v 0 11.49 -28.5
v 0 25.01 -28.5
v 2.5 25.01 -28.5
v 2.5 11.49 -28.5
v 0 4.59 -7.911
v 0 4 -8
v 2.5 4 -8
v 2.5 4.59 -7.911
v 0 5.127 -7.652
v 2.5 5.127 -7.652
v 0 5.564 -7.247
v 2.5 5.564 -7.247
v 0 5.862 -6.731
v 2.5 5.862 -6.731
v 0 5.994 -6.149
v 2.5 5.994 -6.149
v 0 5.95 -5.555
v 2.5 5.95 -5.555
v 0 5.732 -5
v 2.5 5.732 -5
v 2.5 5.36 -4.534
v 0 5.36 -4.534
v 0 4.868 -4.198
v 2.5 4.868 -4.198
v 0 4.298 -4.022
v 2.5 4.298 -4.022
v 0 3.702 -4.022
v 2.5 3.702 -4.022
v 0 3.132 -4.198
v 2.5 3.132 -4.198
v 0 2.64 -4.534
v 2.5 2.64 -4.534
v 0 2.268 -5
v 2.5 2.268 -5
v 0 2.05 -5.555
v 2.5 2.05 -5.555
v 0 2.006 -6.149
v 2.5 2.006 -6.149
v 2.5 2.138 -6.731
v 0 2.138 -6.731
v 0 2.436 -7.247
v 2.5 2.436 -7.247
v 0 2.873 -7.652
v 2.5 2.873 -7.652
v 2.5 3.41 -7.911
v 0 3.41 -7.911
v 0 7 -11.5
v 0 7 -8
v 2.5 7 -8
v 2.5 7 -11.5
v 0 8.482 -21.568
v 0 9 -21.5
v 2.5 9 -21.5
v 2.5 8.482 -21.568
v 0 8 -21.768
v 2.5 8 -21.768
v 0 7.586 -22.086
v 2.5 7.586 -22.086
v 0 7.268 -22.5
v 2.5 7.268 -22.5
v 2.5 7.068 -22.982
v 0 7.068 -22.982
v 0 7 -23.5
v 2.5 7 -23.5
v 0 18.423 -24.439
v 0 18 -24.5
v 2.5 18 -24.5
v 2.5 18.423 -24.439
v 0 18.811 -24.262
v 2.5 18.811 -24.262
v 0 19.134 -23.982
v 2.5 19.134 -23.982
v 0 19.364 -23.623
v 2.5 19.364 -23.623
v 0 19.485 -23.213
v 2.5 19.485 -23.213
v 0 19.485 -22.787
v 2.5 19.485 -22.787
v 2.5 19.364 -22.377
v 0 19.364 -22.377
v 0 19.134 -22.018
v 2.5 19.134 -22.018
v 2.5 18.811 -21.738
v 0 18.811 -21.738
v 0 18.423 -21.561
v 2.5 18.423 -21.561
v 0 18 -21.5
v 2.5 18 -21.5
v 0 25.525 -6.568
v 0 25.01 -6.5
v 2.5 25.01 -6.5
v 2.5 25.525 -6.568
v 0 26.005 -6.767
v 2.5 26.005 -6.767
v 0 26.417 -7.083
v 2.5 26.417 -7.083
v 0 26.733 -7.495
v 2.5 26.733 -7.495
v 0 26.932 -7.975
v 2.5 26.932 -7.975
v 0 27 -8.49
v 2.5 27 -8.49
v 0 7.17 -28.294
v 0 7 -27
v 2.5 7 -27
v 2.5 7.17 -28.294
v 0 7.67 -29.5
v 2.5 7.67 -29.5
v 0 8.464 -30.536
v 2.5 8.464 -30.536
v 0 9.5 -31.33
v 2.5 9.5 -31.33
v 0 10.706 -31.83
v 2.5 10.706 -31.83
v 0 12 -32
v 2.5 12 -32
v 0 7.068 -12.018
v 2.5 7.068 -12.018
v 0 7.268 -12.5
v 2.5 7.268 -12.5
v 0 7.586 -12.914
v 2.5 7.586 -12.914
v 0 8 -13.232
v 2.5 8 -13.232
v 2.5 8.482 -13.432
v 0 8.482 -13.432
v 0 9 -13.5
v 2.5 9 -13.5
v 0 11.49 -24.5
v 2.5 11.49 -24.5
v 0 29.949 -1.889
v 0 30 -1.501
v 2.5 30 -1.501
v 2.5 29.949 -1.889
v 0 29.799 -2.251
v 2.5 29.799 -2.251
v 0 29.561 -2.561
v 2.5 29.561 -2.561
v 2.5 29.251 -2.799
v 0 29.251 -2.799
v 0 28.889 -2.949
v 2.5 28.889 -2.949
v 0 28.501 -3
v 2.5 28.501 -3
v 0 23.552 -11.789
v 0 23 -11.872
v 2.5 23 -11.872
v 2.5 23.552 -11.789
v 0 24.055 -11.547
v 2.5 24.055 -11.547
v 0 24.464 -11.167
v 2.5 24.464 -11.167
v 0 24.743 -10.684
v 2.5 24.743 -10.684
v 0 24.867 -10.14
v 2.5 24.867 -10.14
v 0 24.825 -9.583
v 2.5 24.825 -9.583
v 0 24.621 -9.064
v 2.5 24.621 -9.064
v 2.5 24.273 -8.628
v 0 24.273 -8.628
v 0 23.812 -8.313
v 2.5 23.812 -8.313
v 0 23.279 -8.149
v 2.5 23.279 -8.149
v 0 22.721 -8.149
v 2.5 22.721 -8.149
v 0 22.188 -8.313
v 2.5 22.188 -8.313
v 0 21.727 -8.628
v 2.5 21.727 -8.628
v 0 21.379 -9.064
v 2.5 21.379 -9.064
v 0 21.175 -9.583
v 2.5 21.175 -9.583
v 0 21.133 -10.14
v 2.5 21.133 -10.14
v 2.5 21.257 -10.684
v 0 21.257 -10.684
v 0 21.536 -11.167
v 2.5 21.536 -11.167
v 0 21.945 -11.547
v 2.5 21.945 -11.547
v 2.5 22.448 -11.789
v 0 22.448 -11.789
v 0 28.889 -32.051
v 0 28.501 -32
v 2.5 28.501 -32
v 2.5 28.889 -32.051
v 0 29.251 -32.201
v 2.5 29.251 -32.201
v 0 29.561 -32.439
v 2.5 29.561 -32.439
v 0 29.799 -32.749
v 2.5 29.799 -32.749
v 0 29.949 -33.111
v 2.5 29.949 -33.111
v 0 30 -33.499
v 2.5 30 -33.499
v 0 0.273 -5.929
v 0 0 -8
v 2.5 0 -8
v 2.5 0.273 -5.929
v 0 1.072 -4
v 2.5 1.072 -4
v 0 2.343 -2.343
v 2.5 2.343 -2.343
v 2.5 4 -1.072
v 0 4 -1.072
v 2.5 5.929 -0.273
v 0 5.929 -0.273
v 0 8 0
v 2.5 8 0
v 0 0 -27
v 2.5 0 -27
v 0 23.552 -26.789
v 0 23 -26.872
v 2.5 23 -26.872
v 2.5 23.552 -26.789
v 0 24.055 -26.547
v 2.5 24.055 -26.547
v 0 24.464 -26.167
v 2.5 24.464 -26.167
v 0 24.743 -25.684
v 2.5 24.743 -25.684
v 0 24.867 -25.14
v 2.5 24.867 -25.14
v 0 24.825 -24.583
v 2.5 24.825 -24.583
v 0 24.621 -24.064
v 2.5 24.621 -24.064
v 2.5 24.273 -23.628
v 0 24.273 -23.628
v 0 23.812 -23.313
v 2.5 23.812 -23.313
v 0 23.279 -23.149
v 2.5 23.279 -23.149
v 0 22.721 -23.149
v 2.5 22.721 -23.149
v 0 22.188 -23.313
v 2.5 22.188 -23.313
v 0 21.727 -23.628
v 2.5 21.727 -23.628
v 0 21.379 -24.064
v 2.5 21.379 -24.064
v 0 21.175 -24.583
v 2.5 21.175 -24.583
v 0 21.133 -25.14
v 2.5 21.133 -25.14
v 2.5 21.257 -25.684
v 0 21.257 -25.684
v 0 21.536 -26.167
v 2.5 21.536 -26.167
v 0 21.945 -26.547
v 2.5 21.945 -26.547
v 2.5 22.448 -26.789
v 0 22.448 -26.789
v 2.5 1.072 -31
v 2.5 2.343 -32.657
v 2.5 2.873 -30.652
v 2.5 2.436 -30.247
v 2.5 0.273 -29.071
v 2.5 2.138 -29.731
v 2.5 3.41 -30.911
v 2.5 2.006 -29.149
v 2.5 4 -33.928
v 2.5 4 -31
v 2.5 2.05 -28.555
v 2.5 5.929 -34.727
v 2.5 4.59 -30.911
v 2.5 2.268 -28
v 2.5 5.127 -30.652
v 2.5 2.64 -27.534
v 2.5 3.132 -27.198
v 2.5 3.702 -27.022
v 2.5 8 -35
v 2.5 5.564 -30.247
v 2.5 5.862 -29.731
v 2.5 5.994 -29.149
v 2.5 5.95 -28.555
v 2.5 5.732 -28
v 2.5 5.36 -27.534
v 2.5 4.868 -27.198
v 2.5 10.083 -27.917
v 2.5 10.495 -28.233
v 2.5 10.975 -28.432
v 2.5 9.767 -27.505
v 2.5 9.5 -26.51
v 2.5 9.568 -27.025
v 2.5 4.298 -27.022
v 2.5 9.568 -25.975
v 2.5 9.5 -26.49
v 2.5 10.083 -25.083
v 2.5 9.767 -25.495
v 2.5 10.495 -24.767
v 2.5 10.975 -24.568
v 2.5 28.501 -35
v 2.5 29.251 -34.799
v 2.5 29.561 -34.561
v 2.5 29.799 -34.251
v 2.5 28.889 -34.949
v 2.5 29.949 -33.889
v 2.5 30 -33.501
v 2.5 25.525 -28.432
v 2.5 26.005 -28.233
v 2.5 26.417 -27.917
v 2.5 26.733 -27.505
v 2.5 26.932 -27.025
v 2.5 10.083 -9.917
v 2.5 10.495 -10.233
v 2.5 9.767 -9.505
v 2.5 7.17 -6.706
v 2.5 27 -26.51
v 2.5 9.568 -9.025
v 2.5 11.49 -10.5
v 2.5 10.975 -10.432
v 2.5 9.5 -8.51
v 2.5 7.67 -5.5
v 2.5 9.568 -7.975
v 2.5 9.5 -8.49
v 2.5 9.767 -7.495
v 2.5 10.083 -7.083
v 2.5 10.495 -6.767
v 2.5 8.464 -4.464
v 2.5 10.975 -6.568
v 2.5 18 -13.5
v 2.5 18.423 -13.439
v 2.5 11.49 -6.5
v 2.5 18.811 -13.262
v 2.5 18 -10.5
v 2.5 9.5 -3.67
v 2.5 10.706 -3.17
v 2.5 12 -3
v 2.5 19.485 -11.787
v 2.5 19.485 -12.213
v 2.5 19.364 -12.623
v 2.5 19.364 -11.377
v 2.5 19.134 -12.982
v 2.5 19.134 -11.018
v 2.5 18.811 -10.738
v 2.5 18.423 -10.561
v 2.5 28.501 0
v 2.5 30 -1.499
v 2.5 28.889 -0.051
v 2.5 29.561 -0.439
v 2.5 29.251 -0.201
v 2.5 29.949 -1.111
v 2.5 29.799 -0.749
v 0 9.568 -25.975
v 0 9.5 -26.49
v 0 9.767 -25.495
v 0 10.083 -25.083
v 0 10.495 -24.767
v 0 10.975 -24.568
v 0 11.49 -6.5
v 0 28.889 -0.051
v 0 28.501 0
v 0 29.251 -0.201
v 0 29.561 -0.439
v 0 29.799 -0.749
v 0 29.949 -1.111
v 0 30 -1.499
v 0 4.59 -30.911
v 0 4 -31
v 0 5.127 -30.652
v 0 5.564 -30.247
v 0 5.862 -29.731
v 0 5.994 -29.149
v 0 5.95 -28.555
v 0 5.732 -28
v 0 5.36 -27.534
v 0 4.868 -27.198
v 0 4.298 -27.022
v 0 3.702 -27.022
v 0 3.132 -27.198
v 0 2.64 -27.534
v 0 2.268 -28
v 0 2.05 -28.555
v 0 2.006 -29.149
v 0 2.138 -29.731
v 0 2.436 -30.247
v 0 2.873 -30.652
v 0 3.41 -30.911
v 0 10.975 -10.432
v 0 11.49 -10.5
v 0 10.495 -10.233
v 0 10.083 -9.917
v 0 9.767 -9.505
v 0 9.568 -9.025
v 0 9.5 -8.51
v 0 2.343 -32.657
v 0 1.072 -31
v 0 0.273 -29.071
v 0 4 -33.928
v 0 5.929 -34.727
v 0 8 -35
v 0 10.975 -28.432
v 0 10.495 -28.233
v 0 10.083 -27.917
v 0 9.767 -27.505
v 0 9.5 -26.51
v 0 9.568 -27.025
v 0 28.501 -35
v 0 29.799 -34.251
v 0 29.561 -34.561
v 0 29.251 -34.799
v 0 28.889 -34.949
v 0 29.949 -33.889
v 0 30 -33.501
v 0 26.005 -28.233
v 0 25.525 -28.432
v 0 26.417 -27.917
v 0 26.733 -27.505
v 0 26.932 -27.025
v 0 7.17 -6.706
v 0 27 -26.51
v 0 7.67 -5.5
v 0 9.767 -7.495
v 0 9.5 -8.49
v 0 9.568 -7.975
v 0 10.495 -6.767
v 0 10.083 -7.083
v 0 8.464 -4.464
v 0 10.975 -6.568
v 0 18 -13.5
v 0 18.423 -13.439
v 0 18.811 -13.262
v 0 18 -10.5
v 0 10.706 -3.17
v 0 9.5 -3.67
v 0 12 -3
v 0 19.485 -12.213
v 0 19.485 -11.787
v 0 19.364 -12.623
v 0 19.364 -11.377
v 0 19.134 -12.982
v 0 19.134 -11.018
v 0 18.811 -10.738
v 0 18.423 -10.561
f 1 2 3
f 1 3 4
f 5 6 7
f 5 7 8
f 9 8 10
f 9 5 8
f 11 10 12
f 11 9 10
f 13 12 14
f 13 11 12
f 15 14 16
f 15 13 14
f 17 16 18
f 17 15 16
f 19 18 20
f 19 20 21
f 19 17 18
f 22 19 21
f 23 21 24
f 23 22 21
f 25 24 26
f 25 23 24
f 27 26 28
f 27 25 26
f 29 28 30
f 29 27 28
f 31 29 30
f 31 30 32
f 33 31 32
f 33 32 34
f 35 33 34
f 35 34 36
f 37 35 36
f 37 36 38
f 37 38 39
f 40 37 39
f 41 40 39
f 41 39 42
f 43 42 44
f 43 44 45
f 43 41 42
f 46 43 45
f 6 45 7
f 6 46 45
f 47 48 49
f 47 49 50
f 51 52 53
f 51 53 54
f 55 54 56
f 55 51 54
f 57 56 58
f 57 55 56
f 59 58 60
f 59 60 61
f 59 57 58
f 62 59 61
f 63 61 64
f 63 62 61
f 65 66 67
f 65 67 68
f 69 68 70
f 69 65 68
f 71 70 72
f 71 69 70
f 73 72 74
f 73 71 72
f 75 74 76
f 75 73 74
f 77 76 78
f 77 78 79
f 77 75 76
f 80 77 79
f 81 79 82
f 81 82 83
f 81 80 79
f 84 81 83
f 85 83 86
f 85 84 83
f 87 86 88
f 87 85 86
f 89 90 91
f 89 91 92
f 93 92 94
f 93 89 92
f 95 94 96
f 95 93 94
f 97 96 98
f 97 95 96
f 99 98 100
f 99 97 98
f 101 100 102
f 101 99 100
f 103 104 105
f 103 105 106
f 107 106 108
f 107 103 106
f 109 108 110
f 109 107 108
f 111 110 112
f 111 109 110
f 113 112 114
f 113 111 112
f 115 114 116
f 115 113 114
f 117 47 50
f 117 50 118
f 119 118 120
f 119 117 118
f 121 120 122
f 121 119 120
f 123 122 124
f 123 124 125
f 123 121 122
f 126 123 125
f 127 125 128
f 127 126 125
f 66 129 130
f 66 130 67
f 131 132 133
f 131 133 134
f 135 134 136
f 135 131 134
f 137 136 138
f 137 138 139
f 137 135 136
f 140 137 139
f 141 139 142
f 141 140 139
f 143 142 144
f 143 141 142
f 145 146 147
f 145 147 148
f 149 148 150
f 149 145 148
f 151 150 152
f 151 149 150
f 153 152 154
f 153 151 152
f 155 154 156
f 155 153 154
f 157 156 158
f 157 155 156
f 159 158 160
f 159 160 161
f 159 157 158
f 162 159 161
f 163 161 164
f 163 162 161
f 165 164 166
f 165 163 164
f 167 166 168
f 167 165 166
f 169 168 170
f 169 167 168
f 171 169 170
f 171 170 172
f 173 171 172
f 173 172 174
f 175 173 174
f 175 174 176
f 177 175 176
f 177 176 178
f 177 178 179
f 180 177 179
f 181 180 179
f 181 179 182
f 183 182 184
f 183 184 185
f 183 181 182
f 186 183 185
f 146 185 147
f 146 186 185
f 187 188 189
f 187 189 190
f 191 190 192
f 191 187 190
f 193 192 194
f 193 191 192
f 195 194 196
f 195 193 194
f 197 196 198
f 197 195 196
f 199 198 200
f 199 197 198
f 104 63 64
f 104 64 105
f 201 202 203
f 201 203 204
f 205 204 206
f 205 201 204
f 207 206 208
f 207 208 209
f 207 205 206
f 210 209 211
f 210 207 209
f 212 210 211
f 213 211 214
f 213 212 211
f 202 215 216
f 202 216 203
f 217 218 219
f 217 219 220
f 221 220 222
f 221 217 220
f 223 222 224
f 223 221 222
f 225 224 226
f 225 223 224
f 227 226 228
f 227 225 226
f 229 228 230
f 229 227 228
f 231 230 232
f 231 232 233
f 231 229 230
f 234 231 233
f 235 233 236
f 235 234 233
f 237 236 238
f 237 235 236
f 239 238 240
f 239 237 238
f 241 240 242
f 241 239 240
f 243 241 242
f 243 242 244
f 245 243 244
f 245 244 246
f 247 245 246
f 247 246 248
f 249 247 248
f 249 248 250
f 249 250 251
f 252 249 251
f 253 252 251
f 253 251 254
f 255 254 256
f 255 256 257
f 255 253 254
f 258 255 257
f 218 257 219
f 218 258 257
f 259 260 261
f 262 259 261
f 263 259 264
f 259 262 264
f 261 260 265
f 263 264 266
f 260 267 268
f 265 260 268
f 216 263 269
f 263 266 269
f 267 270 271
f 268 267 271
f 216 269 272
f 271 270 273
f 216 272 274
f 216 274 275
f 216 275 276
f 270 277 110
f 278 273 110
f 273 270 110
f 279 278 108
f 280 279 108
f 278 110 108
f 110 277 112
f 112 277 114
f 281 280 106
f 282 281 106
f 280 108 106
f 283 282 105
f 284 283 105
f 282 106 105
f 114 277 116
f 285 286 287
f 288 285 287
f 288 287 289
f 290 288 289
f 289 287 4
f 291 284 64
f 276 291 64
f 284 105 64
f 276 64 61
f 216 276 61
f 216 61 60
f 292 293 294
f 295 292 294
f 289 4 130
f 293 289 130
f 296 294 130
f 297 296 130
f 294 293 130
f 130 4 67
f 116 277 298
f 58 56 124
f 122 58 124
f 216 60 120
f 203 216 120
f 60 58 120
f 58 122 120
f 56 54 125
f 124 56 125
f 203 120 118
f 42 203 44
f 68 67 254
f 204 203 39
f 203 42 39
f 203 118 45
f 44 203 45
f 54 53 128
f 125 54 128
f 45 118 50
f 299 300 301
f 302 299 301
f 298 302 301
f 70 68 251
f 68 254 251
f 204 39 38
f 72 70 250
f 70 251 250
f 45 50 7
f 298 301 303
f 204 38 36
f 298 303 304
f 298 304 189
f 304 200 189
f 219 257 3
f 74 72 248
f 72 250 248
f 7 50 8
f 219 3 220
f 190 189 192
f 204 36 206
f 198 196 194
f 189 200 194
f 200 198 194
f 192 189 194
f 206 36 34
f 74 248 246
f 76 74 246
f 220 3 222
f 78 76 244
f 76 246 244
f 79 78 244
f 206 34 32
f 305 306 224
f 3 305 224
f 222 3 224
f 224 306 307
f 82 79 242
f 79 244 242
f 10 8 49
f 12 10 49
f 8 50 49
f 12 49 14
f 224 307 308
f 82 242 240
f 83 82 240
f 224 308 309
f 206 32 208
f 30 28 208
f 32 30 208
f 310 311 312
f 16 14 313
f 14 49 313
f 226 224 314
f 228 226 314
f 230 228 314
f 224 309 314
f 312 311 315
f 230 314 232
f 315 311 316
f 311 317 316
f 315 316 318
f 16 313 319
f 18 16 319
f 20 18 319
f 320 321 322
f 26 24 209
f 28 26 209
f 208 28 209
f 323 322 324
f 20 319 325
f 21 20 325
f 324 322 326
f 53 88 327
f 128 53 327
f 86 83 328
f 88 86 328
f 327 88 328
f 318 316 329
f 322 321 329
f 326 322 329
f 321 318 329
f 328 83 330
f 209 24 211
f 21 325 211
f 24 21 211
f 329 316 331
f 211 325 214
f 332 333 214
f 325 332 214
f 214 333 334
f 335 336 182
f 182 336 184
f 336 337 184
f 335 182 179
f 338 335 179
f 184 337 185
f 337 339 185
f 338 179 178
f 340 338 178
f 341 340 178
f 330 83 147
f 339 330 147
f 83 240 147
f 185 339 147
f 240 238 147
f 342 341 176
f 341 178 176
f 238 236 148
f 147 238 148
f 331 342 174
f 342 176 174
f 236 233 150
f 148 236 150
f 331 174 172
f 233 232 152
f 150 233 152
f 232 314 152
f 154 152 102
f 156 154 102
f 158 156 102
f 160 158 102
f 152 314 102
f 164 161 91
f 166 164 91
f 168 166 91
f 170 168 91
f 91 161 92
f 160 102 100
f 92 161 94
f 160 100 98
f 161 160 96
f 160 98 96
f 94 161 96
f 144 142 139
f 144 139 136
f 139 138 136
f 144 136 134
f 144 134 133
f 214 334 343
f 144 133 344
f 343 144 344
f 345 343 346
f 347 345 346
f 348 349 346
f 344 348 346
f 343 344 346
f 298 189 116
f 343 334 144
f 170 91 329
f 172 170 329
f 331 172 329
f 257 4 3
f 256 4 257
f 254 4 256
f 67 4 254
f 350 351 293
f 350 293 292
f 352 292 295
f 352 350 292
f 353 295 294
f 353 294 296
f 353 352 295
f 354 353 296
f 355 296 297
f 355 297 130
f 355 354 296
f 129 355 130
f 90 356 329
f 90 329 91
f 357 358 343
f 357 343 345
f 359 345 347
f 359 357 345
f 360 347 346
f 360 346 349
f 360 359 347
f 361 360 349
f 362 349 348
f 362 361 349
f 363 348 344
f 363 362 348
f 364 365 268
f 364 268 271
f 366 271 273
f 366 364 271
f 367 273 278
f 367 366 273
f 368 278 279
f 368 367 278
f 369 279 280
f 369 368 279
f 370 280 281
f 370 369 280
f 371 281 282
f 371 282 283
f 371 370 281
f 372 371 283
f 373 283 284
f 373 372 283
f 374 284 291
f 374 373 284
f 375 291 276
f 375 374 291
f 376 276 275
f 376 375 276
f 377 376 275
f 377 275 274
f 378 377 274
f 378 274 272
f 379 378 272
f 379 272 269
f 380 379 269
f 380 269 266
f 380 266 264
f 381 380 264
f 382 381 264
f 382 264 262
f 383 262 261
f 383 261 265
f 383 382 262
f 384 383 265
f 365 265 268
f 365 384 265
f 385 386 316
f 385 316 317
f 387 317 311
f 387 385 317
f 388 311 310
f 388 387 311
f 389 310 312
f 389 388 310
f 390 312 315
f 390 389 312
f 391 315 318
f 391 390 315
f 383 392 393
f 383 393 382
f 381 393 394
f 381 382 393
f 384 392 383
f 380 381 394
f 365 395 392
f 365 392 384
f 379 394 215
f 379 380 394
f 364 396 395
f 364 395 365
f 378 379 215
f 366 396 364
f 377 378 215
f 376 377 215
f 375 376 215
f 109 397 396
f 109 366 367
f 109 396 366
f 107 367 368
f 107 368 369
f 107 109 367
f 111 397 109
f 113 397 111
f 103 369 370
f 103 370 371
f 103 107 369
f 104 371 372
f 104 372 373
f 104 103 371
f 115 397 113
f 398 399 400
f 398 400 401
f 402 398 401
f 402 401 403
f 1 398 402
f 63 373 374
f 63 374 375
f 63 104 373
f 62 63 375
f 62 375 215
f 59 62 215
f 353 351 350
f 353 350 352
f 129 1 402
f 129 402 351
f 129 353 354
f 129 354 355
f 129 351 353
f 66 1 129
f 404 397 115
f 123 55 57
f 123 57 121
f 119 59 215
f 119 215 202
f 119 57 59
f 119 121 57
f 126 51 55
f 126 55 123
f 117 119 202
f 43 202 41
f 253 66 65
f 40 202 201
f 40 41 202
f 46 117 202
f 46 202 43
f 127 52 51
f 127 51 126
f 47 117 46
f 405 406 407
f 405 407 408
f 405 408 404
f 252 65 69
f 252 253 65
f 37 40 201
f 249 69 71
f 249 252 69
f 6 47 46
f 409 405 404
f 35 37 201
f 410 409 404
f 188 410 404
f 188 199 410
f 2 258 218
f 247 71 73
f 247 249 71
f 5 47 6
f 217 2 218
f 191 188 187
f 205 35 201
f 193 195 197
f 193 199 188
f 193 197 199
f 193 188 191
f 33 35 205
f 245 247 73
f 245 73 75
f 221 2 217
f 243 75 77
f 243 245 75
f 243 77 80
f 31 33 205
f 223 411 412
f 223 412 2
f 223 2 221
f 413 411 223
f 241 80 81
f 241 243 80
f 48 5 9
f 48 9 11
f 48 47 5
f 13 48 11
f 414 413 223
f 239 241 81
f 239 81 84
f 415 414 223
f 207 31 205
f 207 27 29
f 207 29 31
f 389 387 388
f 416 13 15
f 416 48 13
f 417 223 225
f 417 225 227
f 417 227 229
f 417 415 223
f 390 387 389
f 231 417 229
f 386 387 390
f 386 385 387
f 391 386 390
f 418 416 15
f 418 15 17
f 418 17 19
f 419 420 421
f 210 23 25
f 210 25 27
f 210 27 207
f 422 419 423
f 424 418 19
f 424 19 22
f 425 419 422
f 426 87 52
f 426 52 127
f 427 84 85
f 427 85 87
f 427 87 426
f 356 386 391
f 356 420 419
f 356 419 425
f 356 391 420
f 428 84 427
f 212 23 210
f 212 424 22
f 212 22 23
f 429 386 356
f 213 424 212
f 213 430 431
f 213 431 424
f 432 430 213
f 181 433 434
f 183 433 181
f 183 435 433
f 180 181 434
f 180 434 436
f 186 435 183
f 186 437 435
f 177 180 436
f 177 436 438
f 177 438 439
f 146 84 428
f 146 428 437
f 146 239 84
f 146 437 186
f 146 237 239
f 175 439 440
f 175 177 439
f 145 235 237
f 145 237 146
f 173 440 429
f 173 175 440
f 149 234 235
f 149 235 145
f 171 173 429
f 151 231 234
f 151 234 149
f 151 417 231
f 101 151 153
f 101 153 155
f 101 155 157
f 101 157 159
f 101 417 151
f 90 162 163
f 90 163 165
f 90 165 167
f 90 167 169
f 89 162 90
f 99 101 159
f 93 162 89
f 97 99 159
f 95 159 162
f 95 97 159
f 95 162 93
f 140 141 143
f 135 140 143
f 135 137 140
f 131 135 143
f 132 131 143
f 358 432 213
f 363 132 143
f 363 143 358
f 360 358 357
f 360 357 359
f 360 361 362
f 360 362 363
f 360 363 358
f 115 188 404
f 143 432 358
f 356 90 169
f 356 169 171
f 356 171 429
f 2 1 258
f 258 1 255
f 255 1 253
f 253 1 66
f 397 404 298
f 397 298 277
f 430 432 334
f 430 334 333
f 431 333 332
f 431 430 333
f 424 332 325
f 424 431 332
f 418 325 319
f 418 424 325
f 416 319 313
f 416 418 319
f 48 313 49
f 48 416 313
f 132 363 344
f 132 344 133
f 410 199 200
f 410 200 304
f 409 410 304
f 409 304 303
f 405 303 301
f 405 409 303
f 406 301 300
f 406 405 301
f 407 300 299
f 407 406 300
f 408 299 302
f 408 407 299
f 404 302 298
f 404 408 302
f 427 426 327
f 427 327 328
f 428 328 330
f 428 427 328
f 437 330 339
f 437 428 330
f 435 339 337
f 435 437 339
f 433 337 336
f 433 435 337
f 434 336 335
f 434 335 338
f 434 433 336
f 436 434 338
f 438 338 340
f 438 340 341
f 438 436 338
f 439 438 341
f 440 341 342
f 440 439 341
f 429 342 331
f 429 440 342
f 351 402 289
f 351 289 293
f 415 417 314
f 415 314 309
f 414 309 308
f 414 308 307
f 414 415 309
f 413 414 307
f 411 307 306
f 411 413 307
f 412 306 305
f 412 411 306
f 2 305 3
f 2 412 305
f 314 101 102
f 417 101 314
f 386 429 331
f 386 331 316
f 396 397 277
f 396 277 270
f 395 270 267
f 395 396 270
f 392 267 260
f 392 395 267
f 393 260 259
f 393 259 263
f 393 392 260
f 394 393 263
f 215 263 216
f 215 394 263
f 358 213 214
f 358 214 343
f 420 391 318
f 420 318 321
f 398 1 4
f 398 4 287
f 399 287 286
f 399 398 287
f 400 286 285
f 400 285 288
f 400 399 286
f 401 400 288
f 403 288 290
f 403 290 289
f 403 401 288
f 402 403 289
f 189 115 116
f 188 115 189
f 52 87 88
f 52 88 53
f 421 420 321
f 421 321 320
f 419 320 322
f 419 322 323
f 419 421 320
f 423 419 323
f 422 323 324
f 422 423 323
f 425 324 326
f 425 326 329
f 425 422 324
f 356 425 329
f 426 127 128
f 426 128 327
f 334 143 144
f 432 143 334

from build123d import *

# Parameters (mm, degrees)
SKETCH1_R           = 1.872075336
SKETCH1_R_2         = 2
BOSS_EXTRUDE1_DEPTH = 2.5


with BuildPart() as part:
    # Sketch1 → Boss-Extrude1 (new body)
    with BuildSketch(Plane(origin=(0, 0, 0), x_dir=(0, 0, -1), z_dir=(1, 0, 0))):
        with BuildLine():
            Line((23.5, 7), (27, 7))
            ThreePointArc((27, 7), (30.535533906, 8.464466094), (32, 12))
            Line((32, 12), (32, 28.501))
            ThreePointArc((32, 28.501), (32.439046935, 29.560953065), (33.499, 30))
            Line((33.499, 30), (33.501, 30))
            ThreePointArc((33.501, 30), (34.560953065, 29.560953065), (35, 28.501))
            Line((35, 28.501), (35, 8))
            ThreePointArc((35, 8), (32.656854249, 2.343145751), (27, 0))
            Line((27, 0), (8, 0))
            ThreePointArc((8, 0), (2.343145751, 2.343145751), (0, 8))
            Line((0, 8), (0, 28.501))
            ThreePointArc((0, 28.501), (0.439046935, 29.560953065), (1.499, 30))
            Line((1.499, 30), (1.501, 30))
            ThreePointArc((1.501, 30), (2.560953065, 29.560953065), (3, 28.501))
            Line((3, 28.501), (3, 12))
            ThreePointArc((3, 12), (4.464466094, 8.464466094), (8, 7))
            Line((8, 7), (11.5, 7))
            ThreePointArc((11.5, 7), (12.914213562, 7.585786438), (13.5, 9))
            Line((13.5, 9), (13.5, 18))
            ThreePointArc((13.5, 18), (12, 19.5), (10.5, 18))
            Line((10.5, 18), (10.5, 11.49))
            ThreePointArc((10.5, 11.49), (9.917142495, 10.082857505), (8.51, 9.5))
            Line((8.51, 9.5), (8.49, 9.5))
            ThreePointArc((8.49, 9.5), (7.082857505, 10.082857505), (6.5, 11.49))
            Line((6.5, 11.49), (6.5, 25.01))
            ThreePointArc((6.5, 25.01), (7.082857505, 26.417142495), (8.49, 27))
            Line((8.49, 27), (26.51, 27))
            ThreePointArc((26.51, 27), (27.917142495, 26.417142495), (28.5, 25.01))
            Line((28.5, 25.01), (28.5, 11.49))
            ThreePointArc((28.5, 11.49), (27.917142495, 10.082857505), (26.51, 9.5))
            Line((26.51, 9.5), (26.49, 9.5))
            ThreePointArc((26.49, 9.5), (25.082857505, 10.082857505), (24.5, 11.49))
            Line((24.5, 11.49), (24.5, 18))
            ThreePointArc((24.5, 18), (23, 19.5), (21.5, 18))
            Line((21.5, 18), (21.5, 9))
            ThreePointArc((21.5, 9), (22.085786438, 7.585786438), (23.5, 7))
        make_face()
        with Locations((10, 23)):
            Circle(SKETCH1_R, mode=Mode.SUBTRACT)
        with Locations((25, 23)):
            Circle(SKETCH1_R, mode=Mode.SUBTRACT)
        with Locations((6, 4)):
            Circle(SKETCH1_R_2, mode=Mode.SUBTRACT)
        with Locations((29, 4)):
            Circle(SKETCH1_R_2, mode=Mode.SUBTRACT)
    extrude(amount=BOSS_EXTRUDE1_DEPTH)


solid = part.part
